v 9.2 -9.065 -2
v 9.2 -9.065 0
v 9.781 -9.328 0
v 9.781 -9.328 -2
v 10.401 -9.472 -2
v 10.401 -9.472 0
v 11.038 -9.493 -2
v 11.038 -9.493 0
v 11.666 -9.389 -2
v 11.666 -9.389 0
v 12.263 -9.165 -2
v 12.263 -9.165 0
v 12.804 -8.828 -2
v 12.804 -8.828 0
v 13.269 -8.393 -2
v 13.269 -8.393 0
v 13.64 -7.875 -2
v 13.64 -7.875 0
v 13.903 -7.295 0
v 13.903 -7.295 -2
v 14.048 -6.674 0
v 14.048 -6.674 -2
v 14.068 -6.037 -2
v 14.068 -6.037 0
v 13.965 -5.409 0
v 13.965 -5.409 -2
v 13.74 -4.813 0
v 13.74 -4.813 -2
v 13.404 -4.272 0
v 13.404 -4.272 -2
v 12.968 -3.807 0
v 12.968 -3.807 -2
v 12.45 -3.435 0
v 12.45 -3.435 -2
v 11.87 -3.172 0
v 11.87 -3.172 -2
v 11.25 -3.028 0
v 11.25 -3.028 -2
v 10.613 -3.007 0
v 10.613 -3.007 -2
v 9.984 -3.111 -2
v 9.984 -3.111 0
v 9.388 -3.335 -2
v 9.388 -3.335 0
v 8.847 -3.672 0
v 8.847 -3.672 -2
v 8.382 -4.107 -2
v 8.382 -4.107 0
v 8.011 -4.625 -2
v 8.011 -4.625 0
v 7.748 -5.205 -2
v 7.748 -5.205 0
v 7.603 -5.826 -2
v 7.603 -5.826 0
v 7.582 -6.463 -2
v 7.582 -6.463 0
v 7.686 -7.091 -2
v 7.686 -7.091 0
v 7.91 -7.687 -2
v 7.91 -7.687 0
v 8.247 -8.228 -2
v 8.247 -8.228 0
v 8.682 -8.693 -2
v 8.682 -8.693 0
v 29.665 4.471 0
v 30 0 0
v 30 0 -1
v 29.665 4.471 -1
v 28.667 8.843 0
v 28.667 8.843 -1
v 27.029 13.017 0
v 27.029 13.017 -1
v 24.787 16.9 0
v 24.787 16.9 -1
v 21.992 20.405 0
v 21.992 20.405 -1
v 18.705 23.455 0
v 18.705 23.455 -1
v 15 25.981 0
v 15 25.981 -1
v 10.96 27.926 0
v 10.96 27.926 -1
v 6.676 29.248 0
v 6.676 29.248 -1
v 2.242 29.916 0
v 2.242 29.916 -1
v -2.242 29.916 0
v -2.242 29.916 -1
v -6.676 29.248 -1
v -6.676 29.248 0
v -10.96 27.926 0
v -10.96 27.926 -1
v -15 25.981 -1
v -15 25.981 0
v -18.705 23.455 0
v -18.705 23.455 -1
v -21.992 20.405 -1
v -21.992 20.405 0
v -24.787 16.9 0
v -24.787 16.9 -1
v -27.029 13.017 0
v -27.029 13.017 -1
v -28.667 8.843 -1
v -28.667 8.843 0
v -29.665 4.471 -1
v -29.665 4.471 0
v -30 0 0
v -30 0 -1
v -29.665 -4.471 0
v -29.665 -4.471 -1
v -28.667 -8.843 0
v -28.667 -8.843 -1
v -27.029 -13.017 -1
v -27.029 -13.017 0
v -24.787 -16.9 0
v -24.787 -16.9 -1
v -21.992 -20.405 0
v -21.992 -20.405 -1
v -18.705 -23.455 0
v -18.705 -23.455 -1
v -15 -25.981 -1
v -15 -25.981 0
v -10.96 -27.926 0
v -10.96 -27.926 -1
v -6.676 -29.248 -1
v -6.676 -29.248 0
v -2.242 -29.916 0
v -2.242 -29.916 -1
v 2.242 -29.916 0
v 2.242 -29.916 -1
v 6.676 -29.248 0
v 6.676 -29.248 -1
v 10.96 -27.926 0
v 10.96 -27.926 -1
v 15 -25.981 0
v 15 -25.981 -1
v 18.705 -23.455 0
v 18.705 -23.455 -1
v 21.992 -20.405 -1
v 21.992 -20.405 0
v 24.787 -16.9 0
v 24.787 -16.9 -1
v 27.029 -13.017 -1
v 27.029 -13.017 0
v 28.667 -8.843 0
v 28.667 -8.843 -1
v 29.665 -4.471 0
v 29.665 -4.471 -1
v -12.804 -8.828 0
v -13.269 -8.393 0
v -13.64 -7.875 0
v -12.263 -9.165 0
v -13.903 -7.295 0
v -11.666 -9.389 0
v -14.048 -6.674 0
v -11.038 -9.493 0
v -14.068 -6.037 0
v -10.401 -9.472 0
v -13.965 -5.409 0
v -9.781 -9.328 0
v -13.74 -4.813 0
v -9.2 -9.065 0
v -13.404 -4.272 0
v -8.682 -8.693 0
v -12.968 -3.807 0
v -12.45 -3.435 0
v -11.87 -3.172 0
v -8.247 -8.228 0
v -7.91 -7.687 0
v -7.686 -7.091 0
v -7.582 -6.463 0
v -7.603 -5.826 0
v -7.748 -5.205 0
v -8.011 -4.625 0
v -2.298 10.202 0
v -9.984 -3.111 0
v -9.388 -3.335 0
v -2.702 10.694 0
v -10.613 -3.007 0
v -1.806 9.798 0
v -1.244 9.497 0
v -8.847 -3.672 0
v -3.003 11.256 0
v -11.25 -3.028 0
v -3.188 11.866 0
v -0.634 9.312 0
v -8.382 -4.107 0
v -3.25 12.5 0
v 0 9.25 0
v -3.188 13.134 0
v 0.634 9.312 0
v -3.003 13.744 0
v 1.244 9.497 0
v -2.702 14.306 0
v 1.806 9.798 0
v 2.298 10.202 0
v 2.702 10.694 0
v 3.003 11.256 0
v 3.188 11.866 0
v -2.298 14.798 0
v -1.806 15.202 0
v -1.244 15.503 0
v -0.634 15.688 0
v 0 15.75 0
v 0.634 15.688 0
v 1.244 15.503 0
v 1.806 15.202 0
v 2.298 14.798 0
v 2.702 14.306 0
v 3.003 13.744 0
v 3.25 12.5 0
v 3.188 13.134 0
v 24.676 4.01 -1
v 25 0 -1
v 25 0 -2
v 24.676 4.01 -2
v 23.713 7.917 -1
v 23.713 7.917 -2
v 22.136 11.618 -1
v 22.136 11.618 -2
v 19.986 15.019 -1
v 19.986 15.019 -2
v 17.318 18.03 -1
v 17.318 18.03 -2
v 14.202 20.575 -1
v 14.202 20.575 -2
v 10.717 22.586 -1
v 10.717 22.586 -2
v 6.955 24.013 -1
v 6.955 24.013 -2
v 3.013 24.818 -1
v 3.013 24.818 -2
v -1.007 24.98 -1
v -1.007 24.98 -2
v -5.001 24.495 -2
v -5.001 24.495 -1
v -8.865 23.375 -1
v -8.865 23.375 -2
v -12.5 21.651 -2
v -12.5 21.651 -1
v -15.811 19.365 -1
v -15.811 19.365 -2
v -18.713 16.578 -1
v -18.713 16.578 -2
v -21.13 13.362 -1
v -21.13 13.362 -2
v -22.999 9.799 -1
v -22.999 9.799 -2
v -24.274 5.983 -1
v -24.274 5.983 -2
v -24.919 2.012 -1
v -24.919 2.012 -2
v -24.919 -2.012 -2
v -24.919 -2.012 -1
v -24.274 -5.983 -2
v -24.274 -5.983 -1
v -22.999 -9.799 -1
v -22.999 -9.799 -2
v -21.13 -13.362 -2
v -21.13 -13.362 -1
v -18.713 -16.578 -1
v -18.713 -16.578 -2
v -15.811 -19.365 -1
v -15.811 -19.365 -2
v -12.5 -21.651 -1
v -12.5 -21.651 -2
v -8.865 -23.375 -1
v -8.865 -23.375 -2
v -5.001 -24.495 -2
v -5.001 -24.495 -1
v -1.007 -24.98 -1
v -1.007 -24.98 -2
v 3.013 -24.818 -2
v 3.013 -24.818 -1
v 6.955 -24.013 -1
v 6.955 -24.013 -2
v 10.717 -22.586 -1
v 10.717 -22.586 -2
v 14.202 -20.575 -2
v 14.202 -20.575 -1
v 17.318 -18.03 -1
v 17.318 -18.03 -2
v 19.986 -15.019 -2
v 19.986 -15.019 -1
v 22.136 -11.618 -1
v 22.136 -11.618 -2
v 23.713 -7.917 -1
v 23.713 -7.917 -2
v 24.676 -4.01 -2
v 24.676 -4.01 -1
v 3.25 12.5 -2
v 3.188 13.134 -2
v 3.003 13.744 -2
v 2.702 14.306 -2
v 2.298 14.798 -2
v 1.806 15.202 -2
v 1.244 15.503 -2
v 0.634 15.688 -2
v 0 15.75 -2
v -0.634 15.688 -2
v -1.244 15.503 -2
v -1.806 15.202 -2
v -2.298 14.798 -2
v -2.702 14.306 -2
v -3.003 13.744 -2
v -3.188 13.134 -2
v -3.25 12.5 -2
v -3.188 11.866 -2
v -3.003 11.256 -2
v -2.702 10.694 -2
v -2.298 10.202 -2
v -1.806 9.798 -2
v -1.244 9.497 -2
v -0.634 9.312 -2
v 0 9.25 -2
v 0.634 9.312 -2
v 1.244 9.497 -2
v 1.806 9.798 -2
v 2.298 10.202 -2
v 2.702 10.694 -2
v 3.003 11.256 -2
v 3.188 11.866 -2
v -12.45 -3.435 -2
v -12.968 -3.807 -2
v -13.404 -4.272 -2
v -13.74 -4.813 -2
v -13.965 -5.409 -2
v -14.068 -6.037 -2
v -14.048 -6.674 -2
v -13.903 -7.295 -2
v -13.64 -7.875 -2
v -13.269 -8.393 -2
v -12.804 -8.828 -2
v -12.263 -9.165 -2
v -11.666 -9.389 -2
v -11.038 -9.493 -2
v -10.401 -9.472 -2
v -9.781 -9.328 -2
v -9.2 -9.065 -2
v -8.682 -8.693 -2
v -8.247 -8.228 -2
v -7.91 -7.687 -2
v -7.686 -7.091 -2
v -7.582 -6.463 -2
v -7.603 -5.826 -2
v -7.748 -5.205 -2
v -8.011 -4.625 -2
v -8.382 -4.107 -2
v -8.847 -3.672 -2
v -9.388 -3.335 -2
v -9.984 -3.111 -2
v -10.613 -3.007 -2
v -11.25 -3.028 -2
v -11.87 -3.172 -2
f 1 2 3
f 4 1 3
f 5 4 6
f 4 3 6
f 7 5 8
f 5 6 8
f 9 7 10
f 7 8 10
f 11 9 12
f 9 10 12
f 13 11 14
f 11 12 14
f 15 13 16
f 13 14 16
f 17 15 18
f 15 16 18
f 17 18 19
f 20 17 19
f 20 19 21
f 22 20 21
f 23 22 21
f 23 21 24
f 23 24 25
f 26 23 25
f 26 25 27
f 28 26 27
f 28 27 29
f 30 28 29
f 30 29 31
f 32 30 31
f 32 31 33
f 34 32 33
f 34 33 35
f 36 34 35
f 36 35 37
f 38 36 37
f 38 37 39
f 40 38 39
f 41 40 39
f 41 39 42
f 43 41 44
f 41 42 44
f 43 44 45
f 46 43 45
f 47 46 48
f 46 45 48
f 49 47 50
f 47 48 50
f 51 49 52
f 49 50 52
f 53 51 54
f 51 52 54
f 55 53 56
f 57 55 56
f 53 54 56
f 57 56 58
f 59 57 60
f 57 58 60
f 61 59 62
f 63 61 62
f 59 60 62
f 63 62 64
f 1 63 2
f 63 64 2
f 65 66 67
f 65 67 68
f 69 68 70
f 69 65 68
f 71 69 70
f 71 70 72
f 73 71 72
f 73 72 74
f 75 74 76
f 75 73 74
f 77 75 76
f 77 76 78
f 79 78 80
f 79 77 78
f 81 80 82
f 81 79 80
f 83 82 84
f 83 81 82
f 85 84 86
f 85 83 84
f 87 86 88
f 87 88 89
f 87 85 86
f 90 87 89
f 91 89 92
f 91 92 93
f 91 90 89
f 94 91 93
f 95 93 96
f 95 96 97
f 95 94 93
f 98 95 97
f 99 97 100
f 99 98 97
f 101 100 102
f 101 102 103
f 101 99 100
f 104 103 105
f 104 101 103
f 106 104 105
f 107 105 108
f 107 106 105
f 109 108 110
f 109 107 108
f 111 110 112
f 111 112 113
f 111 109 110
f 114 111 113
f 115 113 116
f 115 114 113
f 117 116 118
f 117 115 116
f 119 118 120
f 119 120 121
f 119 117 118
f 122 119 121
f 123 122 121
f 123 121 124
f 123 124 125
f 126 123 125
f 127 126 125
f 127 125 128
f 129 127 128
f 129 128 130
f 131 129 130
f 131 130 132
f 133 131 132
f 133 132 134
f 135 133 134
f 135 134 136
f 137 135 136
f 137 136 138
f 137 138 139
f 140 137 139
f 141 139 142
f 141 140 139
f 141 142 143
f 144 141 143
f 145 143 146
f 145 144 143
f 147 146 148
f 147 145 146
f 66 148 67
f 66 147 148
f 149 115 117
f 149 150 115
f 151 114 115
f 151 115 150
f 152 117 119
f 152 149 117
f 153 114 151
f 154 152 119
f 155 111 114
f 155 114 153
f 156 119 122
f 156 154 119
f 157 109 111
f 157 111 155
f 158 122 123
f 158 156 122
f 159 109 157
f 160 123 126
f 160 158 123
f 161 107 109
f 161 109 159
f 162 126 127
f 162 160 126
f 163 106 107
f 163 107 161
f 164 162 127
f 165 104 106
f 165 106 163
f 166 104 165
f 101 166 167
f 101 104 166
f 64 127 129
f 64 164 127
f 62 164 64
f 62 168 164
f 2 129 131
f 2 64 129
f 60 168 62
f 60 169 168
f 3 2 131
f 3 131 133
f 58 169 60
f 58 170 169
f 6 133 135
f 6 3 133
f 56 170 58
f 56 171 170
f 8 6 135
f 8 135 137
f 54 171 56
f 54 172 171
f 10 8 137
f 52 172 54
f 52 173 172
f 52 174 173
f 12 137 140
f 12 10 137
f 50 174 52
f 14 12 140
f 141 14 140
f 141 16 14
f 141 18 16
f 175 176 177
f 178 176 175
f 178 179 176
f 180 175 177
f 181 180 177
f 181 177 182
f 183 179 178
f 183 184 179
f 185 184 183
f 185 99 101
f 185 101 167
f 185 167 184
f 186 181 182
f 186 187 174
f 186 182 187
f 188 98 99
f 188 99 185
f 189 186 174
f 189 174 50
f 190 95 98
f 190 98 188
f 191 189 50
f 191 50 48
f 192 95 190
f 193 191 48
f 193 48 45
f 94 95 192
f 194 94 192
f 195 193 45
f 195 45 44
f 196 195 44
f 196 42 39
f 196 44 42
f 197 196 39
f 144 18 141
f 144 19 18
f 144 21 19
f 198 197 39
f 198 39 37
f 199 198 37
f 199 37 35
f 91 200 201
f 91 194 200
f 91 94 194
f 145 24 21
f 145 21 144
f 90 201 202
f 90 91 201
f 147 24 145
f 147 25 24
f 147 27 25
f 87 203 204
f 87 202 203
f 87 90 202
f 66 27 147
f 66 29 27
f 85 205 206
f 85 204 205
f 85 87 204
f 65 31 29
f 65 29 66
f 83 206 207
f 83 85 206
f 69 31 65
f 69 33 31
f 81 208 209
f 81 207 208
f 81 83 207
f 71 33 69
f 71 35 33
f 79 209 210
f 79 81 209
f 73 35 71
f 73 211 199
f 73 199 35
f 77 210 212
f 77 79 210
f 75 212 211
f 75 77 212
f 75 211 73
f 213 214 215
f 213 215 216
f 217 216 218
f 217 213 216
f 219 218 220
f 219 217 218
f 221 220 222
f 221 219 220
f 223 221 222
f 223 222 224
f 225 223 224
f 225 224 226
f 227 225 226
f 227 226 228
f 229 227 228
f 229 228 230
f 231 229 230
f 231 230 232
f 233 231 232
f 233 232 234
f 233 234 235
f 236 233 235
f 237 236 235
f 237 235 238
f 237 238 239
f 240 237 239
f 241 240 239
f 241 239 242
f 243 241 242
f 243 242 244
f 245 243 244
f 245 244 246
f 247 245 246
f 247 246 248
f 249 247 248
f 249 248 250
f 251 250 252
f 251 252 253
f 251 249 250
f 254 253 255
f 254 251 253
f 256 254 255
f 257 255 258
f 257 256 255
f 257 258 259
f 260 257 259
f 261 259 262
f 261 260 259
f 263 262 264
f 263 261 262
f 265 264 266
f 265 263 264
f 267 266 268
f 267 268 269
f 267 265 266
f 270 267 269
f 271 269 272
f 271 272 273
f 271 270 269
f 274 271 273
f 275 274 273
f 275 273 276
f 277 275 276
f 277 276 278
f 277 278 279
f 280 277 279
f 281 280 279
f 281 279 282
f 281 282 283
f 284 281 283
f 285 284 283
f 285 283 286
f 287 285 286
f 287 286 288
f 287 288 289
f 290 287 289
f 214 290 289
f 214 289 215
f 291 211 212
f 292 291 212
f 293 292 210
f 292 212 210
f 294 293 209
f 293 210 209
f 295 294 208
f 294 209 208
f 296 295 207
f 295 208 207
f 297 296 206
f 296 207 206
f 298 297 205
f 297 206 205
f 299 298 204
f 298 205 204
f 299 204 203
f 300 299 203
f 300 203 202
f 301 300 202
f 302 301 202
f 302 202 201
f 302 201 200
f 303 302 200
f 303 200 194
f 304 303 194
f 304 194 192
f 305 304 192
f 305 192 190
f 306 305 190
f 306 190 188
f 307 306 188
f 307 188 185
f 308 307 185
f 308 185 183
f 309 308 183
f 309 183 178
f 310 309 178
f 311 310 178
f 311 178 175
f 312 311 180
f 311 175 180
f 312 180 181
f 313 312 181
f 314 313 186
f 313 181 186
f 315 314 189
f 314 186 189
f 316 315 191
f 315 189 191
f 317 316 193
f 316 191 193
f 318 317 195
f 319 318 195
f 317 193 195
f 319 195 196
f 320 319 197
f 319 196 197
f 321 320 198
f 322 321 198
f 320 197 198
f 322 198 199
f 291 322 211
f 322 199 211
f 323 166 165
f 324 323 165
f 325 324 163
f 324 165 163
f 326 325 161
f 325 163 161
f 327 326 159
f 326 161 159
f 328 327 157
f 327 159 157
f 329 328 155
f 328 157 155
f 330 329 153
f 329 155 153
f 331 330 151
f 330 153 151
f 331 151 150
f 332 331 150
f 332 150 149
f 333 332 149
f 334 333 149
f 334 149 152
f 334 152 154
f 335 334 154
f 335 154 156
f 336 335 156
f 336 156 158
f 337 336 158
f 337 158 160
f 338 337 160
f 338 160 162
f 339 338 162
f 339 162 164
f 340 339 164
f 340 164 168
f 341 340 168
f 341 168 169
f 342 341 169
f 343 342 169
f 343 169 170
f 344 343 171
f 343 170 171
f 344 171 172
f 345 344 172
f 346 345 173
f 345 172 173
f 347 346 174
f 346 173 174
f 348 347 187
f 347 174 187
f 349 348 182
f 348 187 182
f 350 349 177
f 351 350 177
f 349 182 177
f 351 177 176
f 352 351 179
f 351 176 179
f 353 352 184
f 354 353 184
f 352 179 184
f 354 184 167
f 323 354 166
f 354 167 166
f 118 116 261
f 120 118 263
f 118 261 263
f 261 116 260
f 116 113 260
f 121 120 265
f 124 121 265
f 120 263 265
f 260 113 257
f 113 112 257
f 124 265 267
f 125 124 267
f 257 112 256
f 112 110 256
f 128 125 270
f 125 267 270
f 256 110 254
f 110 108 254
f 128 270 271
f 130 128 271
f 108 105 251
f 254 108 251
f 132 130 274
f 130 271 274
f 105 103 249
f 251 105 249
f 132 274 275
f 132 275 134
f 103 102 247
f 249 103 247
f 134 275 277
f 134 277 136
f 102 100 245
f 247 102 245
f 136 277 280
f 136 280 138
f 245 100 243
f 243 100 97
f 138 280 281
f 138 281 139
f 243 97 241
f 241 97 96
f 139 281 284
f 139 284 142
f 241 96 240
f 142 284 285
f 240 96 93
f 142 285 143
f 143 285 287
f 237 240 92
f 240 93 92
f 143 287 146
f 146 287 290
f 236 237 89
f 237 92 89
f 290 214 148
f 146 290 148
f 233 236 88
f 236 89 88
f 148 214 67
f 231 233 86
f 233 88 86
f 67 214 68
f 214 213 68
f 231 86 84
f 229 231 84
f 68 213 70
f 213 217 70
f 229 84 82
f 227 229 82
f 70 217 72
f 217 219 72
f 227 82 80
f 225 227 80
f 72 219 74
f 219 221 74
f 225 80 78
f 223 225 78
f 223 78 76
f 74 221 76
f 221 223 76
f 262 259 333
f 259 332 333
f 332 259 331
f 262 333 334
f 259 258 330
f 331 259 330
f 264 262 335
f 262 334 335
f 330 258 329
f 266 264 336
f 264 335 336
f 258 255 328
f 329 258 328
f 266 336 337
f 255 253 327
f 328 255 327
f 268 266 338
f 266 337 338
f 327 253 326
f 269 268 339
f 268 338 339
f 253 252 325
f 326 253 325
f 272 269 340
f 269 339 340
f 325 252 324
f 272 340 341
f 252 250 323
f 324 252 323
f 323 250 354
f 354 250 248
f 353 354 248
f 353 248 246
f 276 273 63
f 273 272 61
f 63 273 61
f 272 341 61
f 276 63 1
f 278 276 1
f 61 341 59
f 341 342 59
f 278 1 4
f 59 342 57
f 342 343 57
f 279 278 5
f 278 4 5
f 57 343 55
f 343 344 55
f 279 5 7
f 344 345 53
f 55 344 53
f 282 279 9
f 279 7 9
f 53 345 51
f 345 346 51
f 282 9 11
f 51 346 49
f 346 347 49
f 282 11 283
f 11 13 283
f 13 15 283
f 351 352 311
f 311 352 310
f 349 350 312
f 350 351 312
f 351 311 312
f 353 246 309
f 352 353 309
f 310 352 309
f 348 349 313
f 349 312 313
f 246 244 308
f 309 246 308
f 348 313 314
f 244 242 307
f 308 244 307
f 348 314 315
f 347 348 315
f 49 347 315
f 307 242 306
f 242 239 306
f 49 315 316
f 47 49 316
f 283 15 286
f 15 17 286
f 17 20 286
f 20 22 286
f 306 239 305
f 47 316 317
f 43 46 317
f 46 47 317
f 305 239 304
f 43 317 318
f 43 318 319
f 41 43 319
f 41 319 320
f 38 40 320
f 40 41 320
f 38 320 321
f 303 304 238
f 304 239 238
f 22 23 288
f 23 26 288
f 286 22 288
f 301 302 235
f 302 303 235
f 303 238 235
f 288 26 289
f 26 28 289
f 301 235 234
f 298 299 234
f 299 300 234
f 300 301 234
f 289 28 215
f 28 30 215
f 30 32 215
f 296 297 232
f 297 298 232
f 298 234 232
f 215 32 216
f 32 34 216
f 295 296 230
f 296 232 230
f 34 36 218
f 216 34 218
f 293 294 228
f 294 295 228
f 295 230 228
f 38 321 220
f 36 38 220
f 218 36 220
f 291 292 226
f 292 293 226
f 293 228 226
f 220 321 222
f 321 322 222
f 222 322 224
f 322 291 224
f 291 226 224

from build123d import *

# Parameters (mm, degrees)
F1_R            = 25
F1_R_2          = 3.25
F2_DEPTH        = 2
F1_R_3          = 30
F3_DEPTH        = 1
F4_DEPTH        = 25
F4_COPIES_COUNT = 3


# Not quite as in the source:
# - a pattern or mirror of a feature is missing from the dataset's text; its kind, count and spacing are read off the source's solid


with BuildPart() as f2:
    # F1 (on Top) → F2 (new body)
    with BuildSketch(Plane.XY):
        Circle(F1_R)
        with Locations((0, 12.5)):
            Circle(F1_R_2, mode=Mode.SUBTRACT)
        with Locations((0, 12.5)):
            Circle(F1_R_2)
    extrude(amount=-F2_DEPTH)

    # F1 (on Top) → F3 (join)
    with BuildSketch(Plane.XY):
        Circle(F1_R_3)
        Circle(F1_R, mode=Mode.SUBTRACT)
    extrude(amount=-F3_DEPTH)

    # F1 (on Top) → F4 (cut)
    with BuildSketch(Plane.XY):
        with Locations((0, 12.5)):
            Circle(F1_R_2)
    f4 = extrude(amount=-F4_DEPTH, mode=Mode.SUBTRACT)

    # F4_copies: F4 ×3 about axis
    f4_copies_axis = Axis((0, 0, 0), (0, 0, 1))
    for i in range(1, F4_COPIES_COUNT):
        add(f4.rotate(f4_copies_axis, i * 360 / F4_COPIES_COUNT), mode=Mode.SUBTRACT)


solid = f2.part
